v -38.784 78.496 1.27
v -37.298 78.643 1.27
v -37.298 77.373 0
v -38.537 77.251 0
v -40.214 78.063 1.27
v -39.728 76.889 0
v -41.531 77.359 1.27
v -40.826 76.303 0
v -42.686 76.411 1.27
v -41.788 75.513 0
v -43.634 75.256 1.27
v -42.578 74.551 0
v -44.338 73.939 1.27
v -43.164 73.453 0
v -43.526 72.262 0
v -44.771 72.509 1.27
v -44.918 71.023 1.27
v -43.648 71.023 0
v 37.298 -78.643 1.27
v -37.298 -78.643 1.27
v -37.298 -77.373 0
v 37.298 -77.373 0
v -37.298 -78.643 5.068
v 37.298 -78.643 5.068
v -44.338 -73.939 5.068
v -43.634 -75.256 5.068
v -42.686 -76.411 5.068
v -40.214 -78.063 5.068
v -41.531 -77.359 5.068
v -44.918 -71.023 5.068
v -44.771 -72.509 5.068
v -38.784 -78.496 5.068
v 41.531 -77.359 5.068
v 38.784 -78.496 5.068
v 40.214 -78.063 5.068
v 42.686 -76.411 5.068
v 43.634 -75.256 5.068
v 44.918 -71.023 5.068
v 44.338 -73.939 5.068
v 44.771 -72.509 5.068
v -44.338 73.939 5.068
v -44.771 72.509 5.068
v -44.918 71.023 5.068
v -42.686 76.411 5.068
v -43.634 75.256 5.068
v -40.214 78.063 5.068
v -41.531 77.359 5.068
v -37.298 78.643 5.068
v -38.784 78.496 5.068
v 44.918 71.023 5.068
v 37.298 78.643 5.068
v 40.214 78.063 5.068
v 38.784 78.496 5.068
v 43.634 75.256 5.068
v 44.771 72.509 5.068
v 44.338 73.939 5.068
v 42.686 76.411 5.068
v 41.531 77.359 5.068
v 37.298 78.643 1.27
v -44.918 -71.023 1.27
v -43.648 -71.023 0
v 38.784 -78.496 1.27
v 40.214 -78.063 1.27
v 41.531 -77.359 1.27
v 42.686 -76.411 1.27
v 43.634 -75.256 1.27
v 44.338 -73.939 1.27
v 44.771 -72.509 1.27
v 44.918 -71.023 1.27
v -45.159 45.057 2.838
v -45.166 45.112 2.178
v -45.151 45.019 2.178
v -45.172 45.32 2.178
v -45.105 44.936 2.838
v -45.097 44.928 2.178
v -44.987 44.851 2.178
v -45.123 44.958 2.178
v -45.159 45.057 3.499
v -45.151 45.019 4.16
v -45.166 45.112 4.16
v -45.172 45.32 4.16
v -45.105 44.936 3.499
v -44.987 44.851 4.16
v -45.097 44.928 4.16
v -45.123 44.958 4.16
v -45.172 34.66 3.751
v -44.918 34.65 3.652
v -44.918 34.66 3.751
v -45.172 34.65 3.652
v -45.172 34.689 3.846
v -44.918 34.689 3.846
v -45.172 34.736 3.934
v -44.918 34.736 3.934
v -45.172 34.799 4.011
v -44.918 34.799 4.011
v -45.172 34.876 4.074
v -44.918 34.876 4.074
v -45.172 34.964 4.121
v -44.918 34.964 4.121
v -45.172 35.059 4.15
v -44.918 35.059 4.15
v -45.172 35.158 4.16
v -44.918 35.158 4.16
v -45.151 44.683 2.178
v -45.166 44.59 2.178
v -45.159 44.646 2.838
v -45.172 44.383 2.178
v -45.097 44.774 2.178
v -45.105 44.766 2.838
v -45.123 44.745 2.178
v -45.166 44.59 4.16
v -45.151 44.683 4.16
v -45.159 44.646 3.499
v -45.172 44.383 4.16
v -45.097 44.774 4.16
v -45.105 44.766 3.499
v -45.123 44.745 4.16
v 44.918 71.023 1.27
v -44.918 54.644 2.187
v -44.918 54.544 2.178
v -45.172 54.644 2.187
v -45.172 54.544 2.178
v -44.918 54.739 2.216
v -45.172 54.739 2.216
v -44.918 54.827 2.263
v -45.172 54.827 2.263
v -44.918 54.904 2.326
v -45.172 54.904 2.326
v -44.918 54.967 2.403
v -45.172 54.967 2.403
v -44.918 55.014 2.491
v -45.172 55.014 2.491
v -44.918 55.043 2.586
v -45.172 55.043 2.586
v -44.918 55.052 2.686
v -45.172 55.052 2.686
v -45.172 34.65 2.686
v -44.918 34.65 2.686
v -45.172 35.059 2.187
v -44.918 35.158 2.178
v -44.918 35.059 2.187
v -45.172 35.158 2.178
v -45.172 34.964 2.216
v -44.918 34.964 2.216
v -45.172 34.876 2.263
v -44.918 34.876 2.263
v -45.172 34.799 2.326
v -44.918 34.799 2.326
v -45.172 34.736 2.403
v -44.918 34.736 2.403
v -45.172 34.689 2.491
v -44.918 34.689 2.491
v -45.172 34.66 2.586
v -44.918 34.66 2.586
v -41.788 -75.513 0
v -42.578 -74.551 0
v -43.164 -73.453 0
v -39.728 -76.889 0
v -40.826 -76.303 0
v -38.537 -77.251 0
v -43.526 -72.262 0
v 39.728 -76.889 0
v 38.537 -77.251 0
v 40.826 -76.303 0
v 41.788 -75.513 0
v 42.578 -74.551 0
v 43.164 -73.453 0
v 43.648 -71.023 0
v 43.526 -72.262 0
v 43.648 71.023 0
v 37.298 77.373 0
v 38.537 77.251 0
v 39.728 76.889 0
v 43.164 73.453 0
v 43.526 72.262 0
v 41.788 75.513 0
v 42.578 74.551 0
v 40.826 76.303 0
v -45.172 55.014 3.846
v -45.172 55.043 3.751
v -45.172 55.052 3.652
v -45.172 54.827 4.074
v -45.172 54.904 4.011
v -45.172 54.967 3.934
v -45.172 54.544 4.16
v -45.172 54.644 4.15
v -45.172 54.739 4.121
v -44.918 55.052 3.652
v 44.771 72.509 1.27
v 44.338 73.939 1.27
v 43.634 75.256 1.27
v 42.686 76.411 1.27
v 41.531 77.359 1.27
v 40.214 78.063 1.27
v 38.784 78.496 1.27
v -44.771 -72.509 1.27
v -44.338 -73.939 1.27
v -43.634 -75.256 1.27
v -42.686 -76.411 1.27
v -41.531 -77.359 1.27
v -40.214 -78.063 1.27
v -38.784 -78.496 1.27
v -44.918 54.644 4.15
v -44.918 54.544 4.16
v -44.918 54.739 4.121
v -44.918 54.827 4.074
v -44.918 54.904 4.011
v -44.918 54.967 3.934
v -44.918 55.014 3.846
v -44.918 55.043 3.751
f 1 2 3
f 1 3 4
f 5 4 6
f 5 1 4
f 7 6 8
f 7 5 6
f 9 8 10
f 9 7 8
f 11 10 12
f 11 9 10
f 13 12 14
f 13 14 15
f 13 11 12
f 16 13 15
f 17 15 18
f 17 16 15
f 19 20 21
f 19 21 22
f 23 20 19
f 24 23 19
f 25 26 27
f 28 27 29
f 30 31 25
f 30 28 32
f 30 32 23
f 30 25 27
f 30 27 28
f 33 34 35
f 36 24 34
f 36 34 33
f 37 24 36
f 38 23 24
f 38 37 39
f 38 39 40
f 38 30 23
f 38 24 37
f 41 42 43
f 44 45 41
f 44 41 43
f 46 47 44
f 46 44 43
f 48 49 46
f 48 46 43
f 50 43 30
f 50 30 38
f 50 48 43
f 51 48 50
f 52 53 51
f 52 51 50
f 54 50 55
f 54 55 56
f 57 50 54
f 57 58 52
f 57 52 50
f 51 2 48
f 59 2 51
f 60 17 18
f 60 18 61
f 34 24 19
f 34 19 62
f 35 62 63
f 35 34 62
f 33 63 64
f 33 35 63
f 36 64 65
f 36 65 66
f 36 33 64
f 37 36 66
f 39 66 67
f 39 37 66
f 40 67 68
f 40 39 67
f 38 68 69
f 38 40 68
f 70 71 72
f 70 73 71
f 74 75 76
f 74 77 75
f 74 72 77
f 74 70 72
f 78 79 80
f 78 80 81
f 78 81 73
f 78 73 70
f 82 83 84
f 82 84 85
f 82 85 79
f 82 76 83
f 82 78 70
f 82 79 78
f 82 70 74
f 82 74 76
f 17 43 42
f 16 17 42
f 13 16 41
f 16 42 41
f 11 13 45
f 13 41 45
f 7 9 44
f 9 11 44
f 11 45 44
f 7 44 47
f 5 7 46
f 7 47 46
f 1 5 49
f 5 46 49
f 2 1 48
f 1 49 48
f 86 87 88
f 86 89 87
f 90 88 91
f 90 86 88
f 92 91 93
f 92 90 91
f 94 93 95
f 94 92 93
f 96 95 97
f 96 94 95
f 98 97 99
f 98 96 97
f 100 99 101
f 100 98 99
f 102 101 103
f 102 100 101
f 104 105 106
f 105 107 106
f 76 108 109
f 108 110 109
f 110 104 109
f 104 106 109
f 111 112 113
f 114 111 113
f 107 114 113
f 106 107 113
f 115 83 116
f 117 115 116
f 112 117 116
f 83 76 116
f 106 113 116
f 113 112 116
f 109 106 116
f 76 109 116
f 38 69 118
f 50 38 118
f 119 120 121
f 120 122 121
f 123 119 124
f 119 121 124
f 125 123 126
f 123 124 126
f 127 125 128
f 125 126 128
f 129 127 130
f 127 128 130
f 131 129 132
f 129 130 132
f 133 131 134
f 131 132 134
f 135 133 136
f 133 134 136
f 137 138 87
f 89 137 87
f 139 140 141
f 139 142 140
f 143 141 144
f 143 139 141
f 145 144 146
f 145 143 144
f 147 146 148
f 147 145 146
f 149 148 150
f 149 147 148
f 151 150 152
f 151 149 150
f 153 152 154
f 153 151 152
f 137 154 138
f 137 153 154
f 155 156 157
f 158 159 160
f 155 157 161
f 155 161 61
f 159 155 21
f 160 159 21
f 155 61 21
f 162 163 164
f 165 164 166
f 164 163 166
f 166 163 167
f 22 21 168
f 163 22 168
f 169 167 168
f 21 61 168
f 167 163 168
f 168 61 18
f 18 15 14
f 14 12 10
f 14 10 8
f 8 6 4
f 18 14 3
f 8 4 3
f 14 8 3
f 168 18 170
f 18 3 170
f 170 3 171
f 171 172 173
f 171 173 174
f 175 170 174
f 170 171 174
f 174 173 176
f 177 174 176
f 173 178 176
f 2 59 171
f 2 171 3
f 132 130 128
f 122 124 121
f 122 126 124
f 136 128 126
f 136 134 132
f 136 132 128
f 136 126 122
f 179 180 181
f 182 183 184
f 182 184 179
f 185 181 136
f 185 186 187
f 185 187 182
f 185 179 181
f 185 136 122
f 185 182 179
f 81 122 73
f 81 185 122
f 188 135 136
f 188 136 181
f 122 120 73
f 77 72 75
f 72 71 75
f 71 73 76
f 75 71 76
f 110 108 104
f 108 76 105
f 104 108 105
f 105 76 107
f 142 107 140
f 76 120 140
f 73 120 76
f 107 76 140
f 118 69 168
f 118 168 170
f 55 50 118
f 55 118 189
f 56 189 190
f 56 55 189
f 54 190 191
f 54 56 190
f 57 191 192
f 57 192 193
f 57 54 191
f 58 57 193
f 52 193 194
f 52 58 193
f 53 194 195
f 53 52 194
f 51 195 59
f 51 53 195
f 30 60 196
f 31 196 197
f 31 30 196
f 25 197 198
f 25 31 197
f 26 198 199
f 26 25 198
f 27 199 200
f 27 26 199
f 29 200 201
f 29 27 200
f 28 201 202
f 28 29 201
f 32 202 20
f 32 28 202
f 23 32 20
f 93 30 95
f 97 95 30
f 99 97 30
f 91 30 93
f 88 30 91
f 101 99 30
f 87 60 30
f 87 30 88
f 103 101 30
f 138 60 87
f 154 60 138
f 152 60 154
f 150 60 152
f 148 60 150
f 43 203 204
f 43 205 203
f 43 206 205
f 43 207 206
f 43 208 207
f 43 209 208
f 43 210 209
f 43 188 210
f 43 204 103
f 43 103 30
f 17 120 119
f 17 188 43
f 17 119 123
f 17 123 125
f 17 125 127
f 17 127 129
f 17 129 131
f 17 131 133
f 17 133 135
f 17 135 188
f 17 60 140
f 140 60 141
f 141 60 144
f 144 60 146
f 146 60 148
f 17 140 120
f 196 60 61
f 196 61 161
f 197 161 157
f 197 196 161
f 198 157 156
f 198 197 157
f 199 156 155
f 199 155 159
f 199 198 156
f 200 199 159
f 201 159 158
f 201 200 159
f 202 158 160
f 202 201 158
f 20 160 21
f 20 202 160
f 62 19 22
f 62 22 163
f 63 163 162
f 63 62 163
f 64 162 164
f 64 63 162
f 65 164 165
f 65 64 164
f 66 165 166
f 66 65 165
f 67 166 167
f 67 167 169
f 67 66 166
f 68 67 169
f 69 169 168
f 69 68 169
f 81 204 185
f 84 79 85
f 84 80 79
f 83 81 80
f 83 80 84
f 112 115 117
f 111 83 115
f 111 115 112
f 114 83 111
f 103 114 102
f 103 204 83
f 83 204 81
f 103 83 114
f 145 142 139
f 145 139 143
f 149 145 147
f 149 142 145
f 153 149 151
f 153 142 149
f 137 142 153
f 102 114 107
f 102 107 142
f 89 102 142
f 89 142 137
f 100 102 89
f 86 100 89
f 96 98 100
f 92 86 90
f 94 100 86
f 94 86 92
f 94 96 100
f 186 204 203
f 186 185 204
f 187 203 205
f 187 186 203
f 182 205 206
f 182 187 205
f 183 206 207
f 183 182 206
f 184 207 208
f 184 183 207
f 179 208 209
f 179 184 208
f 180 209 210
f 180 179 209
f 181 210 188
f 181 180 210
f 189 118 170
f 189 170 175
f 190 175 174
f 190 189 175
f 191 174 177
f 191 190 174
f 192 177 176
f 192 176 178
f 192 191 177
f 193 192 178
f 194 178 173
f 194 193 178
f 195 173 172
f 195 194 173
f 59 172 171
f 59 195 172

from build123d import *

# Parameters (mm, degrees)
F0_W     = 89.835614
F0_H     = 157.285422
F1_DEPTH = 5.067615
F2_R     = 7.62
F3_SIZE  = 1.27
F4_W     = 20.402283
F4_H     = 1.982419
F5_DEPTH = 0.254
F6_R     = 0.508
F8_DEPTH = 4.161017


with BuildPart() as f1:
    # F0 (on Top) → F1 (new body)
    with BuildSketch(Plane.XY):
        Rectangle(F0_W, F0_H)
    extrude(amount=F1_DEPTH)

    # F2
    f2_edges = [f1.edges().sort_by_distance(p)[0] for p in [
        (-44.917807, -78.642711, 2.533807),
        (44.917807, -78.642711, 2.533807),
        (44.917807, 78.642711, 2.533807),
        (-44.917807, 78.642711, 2.533807),
    ]]
    fillet(f2_edges, radius=F2_R)

    # F3
    f3_edges = [f1.edges().sort_by_distance(p)[0] for p in [
        (0, -78.642711, 0),
        (-42.685961, -76.410865, 0),
        (42.685961, -76.410865, 0),
        (-44.917807, 0, 0),
        (44.917807, 0, 0),
        (-42.685961, 76.410865, 0),
        (42.685961, 76.410865, 0),
        (0, 78.642711, 0),
    ]]
    chamfer(f3_edges, length=F3_SIZE)

    # F4 (on face) → F5 (join)
    with BuildSketch(Plane(origin=(-44.917807, 0, 0), x_dir=(0, -1, 0), z_dir=(-1, 0, 0))):
        with Locations((-44.85131, 3.168807)):
            Rectangle(F4_W, F4_H)
    extrude(amount=F5_DEPTH)

    # F6
    f6_edges = [f1.edges().sort_by_distance(p)[0] for p in [
        (-45.044807, 34.650169, 4.160017),
        (-45.044807, 34.650169, 2.177598),
        (-45.044807, 55.052452, 4.160017),
        (-45.044807, 55.052452, 2.177598),
    ]]
    fillet(f6_edges, radius=F6_R)

    # F7 (on face) → F8 (cut, through all)
    with BuildSketch(Plane.XY.offset(4.160017)):
        Polygon((-45.171807, 44.38271), (-45.171807, 45.319911), (-45.36023, 45.319911), (-45.403026, 44.620808), align=None)
        with BuildLine():
            add(Edge.make_bspline(
                [(-45.171807, 45.319911), (-45.171807, 44.950147), (-45.145225, 44.954358), (-44.987373, 44.851311)],
                knots=[0, 0, 0, 0, 0.503589, 0.503589, 0.503589, 0.503589], degree=3))
            Line((-45.171807, 45.319911), (-45.171807, 44.38271))
            add(Edge.make_bspline(
                [(-45.171807, 44.38271), (-45.171807, 44.752474), (-45.145225, 44.748263), (-44.987373, 44.851311)],
                knots=[0, 0, 0, 0, 0.503589, 0.503589, 0.503589, 0.503589], degree=3))
        make_face()
    extrude(amount=-F8_DEPTH, mode=Mode.SUBTRACT)


solid = f1.part
